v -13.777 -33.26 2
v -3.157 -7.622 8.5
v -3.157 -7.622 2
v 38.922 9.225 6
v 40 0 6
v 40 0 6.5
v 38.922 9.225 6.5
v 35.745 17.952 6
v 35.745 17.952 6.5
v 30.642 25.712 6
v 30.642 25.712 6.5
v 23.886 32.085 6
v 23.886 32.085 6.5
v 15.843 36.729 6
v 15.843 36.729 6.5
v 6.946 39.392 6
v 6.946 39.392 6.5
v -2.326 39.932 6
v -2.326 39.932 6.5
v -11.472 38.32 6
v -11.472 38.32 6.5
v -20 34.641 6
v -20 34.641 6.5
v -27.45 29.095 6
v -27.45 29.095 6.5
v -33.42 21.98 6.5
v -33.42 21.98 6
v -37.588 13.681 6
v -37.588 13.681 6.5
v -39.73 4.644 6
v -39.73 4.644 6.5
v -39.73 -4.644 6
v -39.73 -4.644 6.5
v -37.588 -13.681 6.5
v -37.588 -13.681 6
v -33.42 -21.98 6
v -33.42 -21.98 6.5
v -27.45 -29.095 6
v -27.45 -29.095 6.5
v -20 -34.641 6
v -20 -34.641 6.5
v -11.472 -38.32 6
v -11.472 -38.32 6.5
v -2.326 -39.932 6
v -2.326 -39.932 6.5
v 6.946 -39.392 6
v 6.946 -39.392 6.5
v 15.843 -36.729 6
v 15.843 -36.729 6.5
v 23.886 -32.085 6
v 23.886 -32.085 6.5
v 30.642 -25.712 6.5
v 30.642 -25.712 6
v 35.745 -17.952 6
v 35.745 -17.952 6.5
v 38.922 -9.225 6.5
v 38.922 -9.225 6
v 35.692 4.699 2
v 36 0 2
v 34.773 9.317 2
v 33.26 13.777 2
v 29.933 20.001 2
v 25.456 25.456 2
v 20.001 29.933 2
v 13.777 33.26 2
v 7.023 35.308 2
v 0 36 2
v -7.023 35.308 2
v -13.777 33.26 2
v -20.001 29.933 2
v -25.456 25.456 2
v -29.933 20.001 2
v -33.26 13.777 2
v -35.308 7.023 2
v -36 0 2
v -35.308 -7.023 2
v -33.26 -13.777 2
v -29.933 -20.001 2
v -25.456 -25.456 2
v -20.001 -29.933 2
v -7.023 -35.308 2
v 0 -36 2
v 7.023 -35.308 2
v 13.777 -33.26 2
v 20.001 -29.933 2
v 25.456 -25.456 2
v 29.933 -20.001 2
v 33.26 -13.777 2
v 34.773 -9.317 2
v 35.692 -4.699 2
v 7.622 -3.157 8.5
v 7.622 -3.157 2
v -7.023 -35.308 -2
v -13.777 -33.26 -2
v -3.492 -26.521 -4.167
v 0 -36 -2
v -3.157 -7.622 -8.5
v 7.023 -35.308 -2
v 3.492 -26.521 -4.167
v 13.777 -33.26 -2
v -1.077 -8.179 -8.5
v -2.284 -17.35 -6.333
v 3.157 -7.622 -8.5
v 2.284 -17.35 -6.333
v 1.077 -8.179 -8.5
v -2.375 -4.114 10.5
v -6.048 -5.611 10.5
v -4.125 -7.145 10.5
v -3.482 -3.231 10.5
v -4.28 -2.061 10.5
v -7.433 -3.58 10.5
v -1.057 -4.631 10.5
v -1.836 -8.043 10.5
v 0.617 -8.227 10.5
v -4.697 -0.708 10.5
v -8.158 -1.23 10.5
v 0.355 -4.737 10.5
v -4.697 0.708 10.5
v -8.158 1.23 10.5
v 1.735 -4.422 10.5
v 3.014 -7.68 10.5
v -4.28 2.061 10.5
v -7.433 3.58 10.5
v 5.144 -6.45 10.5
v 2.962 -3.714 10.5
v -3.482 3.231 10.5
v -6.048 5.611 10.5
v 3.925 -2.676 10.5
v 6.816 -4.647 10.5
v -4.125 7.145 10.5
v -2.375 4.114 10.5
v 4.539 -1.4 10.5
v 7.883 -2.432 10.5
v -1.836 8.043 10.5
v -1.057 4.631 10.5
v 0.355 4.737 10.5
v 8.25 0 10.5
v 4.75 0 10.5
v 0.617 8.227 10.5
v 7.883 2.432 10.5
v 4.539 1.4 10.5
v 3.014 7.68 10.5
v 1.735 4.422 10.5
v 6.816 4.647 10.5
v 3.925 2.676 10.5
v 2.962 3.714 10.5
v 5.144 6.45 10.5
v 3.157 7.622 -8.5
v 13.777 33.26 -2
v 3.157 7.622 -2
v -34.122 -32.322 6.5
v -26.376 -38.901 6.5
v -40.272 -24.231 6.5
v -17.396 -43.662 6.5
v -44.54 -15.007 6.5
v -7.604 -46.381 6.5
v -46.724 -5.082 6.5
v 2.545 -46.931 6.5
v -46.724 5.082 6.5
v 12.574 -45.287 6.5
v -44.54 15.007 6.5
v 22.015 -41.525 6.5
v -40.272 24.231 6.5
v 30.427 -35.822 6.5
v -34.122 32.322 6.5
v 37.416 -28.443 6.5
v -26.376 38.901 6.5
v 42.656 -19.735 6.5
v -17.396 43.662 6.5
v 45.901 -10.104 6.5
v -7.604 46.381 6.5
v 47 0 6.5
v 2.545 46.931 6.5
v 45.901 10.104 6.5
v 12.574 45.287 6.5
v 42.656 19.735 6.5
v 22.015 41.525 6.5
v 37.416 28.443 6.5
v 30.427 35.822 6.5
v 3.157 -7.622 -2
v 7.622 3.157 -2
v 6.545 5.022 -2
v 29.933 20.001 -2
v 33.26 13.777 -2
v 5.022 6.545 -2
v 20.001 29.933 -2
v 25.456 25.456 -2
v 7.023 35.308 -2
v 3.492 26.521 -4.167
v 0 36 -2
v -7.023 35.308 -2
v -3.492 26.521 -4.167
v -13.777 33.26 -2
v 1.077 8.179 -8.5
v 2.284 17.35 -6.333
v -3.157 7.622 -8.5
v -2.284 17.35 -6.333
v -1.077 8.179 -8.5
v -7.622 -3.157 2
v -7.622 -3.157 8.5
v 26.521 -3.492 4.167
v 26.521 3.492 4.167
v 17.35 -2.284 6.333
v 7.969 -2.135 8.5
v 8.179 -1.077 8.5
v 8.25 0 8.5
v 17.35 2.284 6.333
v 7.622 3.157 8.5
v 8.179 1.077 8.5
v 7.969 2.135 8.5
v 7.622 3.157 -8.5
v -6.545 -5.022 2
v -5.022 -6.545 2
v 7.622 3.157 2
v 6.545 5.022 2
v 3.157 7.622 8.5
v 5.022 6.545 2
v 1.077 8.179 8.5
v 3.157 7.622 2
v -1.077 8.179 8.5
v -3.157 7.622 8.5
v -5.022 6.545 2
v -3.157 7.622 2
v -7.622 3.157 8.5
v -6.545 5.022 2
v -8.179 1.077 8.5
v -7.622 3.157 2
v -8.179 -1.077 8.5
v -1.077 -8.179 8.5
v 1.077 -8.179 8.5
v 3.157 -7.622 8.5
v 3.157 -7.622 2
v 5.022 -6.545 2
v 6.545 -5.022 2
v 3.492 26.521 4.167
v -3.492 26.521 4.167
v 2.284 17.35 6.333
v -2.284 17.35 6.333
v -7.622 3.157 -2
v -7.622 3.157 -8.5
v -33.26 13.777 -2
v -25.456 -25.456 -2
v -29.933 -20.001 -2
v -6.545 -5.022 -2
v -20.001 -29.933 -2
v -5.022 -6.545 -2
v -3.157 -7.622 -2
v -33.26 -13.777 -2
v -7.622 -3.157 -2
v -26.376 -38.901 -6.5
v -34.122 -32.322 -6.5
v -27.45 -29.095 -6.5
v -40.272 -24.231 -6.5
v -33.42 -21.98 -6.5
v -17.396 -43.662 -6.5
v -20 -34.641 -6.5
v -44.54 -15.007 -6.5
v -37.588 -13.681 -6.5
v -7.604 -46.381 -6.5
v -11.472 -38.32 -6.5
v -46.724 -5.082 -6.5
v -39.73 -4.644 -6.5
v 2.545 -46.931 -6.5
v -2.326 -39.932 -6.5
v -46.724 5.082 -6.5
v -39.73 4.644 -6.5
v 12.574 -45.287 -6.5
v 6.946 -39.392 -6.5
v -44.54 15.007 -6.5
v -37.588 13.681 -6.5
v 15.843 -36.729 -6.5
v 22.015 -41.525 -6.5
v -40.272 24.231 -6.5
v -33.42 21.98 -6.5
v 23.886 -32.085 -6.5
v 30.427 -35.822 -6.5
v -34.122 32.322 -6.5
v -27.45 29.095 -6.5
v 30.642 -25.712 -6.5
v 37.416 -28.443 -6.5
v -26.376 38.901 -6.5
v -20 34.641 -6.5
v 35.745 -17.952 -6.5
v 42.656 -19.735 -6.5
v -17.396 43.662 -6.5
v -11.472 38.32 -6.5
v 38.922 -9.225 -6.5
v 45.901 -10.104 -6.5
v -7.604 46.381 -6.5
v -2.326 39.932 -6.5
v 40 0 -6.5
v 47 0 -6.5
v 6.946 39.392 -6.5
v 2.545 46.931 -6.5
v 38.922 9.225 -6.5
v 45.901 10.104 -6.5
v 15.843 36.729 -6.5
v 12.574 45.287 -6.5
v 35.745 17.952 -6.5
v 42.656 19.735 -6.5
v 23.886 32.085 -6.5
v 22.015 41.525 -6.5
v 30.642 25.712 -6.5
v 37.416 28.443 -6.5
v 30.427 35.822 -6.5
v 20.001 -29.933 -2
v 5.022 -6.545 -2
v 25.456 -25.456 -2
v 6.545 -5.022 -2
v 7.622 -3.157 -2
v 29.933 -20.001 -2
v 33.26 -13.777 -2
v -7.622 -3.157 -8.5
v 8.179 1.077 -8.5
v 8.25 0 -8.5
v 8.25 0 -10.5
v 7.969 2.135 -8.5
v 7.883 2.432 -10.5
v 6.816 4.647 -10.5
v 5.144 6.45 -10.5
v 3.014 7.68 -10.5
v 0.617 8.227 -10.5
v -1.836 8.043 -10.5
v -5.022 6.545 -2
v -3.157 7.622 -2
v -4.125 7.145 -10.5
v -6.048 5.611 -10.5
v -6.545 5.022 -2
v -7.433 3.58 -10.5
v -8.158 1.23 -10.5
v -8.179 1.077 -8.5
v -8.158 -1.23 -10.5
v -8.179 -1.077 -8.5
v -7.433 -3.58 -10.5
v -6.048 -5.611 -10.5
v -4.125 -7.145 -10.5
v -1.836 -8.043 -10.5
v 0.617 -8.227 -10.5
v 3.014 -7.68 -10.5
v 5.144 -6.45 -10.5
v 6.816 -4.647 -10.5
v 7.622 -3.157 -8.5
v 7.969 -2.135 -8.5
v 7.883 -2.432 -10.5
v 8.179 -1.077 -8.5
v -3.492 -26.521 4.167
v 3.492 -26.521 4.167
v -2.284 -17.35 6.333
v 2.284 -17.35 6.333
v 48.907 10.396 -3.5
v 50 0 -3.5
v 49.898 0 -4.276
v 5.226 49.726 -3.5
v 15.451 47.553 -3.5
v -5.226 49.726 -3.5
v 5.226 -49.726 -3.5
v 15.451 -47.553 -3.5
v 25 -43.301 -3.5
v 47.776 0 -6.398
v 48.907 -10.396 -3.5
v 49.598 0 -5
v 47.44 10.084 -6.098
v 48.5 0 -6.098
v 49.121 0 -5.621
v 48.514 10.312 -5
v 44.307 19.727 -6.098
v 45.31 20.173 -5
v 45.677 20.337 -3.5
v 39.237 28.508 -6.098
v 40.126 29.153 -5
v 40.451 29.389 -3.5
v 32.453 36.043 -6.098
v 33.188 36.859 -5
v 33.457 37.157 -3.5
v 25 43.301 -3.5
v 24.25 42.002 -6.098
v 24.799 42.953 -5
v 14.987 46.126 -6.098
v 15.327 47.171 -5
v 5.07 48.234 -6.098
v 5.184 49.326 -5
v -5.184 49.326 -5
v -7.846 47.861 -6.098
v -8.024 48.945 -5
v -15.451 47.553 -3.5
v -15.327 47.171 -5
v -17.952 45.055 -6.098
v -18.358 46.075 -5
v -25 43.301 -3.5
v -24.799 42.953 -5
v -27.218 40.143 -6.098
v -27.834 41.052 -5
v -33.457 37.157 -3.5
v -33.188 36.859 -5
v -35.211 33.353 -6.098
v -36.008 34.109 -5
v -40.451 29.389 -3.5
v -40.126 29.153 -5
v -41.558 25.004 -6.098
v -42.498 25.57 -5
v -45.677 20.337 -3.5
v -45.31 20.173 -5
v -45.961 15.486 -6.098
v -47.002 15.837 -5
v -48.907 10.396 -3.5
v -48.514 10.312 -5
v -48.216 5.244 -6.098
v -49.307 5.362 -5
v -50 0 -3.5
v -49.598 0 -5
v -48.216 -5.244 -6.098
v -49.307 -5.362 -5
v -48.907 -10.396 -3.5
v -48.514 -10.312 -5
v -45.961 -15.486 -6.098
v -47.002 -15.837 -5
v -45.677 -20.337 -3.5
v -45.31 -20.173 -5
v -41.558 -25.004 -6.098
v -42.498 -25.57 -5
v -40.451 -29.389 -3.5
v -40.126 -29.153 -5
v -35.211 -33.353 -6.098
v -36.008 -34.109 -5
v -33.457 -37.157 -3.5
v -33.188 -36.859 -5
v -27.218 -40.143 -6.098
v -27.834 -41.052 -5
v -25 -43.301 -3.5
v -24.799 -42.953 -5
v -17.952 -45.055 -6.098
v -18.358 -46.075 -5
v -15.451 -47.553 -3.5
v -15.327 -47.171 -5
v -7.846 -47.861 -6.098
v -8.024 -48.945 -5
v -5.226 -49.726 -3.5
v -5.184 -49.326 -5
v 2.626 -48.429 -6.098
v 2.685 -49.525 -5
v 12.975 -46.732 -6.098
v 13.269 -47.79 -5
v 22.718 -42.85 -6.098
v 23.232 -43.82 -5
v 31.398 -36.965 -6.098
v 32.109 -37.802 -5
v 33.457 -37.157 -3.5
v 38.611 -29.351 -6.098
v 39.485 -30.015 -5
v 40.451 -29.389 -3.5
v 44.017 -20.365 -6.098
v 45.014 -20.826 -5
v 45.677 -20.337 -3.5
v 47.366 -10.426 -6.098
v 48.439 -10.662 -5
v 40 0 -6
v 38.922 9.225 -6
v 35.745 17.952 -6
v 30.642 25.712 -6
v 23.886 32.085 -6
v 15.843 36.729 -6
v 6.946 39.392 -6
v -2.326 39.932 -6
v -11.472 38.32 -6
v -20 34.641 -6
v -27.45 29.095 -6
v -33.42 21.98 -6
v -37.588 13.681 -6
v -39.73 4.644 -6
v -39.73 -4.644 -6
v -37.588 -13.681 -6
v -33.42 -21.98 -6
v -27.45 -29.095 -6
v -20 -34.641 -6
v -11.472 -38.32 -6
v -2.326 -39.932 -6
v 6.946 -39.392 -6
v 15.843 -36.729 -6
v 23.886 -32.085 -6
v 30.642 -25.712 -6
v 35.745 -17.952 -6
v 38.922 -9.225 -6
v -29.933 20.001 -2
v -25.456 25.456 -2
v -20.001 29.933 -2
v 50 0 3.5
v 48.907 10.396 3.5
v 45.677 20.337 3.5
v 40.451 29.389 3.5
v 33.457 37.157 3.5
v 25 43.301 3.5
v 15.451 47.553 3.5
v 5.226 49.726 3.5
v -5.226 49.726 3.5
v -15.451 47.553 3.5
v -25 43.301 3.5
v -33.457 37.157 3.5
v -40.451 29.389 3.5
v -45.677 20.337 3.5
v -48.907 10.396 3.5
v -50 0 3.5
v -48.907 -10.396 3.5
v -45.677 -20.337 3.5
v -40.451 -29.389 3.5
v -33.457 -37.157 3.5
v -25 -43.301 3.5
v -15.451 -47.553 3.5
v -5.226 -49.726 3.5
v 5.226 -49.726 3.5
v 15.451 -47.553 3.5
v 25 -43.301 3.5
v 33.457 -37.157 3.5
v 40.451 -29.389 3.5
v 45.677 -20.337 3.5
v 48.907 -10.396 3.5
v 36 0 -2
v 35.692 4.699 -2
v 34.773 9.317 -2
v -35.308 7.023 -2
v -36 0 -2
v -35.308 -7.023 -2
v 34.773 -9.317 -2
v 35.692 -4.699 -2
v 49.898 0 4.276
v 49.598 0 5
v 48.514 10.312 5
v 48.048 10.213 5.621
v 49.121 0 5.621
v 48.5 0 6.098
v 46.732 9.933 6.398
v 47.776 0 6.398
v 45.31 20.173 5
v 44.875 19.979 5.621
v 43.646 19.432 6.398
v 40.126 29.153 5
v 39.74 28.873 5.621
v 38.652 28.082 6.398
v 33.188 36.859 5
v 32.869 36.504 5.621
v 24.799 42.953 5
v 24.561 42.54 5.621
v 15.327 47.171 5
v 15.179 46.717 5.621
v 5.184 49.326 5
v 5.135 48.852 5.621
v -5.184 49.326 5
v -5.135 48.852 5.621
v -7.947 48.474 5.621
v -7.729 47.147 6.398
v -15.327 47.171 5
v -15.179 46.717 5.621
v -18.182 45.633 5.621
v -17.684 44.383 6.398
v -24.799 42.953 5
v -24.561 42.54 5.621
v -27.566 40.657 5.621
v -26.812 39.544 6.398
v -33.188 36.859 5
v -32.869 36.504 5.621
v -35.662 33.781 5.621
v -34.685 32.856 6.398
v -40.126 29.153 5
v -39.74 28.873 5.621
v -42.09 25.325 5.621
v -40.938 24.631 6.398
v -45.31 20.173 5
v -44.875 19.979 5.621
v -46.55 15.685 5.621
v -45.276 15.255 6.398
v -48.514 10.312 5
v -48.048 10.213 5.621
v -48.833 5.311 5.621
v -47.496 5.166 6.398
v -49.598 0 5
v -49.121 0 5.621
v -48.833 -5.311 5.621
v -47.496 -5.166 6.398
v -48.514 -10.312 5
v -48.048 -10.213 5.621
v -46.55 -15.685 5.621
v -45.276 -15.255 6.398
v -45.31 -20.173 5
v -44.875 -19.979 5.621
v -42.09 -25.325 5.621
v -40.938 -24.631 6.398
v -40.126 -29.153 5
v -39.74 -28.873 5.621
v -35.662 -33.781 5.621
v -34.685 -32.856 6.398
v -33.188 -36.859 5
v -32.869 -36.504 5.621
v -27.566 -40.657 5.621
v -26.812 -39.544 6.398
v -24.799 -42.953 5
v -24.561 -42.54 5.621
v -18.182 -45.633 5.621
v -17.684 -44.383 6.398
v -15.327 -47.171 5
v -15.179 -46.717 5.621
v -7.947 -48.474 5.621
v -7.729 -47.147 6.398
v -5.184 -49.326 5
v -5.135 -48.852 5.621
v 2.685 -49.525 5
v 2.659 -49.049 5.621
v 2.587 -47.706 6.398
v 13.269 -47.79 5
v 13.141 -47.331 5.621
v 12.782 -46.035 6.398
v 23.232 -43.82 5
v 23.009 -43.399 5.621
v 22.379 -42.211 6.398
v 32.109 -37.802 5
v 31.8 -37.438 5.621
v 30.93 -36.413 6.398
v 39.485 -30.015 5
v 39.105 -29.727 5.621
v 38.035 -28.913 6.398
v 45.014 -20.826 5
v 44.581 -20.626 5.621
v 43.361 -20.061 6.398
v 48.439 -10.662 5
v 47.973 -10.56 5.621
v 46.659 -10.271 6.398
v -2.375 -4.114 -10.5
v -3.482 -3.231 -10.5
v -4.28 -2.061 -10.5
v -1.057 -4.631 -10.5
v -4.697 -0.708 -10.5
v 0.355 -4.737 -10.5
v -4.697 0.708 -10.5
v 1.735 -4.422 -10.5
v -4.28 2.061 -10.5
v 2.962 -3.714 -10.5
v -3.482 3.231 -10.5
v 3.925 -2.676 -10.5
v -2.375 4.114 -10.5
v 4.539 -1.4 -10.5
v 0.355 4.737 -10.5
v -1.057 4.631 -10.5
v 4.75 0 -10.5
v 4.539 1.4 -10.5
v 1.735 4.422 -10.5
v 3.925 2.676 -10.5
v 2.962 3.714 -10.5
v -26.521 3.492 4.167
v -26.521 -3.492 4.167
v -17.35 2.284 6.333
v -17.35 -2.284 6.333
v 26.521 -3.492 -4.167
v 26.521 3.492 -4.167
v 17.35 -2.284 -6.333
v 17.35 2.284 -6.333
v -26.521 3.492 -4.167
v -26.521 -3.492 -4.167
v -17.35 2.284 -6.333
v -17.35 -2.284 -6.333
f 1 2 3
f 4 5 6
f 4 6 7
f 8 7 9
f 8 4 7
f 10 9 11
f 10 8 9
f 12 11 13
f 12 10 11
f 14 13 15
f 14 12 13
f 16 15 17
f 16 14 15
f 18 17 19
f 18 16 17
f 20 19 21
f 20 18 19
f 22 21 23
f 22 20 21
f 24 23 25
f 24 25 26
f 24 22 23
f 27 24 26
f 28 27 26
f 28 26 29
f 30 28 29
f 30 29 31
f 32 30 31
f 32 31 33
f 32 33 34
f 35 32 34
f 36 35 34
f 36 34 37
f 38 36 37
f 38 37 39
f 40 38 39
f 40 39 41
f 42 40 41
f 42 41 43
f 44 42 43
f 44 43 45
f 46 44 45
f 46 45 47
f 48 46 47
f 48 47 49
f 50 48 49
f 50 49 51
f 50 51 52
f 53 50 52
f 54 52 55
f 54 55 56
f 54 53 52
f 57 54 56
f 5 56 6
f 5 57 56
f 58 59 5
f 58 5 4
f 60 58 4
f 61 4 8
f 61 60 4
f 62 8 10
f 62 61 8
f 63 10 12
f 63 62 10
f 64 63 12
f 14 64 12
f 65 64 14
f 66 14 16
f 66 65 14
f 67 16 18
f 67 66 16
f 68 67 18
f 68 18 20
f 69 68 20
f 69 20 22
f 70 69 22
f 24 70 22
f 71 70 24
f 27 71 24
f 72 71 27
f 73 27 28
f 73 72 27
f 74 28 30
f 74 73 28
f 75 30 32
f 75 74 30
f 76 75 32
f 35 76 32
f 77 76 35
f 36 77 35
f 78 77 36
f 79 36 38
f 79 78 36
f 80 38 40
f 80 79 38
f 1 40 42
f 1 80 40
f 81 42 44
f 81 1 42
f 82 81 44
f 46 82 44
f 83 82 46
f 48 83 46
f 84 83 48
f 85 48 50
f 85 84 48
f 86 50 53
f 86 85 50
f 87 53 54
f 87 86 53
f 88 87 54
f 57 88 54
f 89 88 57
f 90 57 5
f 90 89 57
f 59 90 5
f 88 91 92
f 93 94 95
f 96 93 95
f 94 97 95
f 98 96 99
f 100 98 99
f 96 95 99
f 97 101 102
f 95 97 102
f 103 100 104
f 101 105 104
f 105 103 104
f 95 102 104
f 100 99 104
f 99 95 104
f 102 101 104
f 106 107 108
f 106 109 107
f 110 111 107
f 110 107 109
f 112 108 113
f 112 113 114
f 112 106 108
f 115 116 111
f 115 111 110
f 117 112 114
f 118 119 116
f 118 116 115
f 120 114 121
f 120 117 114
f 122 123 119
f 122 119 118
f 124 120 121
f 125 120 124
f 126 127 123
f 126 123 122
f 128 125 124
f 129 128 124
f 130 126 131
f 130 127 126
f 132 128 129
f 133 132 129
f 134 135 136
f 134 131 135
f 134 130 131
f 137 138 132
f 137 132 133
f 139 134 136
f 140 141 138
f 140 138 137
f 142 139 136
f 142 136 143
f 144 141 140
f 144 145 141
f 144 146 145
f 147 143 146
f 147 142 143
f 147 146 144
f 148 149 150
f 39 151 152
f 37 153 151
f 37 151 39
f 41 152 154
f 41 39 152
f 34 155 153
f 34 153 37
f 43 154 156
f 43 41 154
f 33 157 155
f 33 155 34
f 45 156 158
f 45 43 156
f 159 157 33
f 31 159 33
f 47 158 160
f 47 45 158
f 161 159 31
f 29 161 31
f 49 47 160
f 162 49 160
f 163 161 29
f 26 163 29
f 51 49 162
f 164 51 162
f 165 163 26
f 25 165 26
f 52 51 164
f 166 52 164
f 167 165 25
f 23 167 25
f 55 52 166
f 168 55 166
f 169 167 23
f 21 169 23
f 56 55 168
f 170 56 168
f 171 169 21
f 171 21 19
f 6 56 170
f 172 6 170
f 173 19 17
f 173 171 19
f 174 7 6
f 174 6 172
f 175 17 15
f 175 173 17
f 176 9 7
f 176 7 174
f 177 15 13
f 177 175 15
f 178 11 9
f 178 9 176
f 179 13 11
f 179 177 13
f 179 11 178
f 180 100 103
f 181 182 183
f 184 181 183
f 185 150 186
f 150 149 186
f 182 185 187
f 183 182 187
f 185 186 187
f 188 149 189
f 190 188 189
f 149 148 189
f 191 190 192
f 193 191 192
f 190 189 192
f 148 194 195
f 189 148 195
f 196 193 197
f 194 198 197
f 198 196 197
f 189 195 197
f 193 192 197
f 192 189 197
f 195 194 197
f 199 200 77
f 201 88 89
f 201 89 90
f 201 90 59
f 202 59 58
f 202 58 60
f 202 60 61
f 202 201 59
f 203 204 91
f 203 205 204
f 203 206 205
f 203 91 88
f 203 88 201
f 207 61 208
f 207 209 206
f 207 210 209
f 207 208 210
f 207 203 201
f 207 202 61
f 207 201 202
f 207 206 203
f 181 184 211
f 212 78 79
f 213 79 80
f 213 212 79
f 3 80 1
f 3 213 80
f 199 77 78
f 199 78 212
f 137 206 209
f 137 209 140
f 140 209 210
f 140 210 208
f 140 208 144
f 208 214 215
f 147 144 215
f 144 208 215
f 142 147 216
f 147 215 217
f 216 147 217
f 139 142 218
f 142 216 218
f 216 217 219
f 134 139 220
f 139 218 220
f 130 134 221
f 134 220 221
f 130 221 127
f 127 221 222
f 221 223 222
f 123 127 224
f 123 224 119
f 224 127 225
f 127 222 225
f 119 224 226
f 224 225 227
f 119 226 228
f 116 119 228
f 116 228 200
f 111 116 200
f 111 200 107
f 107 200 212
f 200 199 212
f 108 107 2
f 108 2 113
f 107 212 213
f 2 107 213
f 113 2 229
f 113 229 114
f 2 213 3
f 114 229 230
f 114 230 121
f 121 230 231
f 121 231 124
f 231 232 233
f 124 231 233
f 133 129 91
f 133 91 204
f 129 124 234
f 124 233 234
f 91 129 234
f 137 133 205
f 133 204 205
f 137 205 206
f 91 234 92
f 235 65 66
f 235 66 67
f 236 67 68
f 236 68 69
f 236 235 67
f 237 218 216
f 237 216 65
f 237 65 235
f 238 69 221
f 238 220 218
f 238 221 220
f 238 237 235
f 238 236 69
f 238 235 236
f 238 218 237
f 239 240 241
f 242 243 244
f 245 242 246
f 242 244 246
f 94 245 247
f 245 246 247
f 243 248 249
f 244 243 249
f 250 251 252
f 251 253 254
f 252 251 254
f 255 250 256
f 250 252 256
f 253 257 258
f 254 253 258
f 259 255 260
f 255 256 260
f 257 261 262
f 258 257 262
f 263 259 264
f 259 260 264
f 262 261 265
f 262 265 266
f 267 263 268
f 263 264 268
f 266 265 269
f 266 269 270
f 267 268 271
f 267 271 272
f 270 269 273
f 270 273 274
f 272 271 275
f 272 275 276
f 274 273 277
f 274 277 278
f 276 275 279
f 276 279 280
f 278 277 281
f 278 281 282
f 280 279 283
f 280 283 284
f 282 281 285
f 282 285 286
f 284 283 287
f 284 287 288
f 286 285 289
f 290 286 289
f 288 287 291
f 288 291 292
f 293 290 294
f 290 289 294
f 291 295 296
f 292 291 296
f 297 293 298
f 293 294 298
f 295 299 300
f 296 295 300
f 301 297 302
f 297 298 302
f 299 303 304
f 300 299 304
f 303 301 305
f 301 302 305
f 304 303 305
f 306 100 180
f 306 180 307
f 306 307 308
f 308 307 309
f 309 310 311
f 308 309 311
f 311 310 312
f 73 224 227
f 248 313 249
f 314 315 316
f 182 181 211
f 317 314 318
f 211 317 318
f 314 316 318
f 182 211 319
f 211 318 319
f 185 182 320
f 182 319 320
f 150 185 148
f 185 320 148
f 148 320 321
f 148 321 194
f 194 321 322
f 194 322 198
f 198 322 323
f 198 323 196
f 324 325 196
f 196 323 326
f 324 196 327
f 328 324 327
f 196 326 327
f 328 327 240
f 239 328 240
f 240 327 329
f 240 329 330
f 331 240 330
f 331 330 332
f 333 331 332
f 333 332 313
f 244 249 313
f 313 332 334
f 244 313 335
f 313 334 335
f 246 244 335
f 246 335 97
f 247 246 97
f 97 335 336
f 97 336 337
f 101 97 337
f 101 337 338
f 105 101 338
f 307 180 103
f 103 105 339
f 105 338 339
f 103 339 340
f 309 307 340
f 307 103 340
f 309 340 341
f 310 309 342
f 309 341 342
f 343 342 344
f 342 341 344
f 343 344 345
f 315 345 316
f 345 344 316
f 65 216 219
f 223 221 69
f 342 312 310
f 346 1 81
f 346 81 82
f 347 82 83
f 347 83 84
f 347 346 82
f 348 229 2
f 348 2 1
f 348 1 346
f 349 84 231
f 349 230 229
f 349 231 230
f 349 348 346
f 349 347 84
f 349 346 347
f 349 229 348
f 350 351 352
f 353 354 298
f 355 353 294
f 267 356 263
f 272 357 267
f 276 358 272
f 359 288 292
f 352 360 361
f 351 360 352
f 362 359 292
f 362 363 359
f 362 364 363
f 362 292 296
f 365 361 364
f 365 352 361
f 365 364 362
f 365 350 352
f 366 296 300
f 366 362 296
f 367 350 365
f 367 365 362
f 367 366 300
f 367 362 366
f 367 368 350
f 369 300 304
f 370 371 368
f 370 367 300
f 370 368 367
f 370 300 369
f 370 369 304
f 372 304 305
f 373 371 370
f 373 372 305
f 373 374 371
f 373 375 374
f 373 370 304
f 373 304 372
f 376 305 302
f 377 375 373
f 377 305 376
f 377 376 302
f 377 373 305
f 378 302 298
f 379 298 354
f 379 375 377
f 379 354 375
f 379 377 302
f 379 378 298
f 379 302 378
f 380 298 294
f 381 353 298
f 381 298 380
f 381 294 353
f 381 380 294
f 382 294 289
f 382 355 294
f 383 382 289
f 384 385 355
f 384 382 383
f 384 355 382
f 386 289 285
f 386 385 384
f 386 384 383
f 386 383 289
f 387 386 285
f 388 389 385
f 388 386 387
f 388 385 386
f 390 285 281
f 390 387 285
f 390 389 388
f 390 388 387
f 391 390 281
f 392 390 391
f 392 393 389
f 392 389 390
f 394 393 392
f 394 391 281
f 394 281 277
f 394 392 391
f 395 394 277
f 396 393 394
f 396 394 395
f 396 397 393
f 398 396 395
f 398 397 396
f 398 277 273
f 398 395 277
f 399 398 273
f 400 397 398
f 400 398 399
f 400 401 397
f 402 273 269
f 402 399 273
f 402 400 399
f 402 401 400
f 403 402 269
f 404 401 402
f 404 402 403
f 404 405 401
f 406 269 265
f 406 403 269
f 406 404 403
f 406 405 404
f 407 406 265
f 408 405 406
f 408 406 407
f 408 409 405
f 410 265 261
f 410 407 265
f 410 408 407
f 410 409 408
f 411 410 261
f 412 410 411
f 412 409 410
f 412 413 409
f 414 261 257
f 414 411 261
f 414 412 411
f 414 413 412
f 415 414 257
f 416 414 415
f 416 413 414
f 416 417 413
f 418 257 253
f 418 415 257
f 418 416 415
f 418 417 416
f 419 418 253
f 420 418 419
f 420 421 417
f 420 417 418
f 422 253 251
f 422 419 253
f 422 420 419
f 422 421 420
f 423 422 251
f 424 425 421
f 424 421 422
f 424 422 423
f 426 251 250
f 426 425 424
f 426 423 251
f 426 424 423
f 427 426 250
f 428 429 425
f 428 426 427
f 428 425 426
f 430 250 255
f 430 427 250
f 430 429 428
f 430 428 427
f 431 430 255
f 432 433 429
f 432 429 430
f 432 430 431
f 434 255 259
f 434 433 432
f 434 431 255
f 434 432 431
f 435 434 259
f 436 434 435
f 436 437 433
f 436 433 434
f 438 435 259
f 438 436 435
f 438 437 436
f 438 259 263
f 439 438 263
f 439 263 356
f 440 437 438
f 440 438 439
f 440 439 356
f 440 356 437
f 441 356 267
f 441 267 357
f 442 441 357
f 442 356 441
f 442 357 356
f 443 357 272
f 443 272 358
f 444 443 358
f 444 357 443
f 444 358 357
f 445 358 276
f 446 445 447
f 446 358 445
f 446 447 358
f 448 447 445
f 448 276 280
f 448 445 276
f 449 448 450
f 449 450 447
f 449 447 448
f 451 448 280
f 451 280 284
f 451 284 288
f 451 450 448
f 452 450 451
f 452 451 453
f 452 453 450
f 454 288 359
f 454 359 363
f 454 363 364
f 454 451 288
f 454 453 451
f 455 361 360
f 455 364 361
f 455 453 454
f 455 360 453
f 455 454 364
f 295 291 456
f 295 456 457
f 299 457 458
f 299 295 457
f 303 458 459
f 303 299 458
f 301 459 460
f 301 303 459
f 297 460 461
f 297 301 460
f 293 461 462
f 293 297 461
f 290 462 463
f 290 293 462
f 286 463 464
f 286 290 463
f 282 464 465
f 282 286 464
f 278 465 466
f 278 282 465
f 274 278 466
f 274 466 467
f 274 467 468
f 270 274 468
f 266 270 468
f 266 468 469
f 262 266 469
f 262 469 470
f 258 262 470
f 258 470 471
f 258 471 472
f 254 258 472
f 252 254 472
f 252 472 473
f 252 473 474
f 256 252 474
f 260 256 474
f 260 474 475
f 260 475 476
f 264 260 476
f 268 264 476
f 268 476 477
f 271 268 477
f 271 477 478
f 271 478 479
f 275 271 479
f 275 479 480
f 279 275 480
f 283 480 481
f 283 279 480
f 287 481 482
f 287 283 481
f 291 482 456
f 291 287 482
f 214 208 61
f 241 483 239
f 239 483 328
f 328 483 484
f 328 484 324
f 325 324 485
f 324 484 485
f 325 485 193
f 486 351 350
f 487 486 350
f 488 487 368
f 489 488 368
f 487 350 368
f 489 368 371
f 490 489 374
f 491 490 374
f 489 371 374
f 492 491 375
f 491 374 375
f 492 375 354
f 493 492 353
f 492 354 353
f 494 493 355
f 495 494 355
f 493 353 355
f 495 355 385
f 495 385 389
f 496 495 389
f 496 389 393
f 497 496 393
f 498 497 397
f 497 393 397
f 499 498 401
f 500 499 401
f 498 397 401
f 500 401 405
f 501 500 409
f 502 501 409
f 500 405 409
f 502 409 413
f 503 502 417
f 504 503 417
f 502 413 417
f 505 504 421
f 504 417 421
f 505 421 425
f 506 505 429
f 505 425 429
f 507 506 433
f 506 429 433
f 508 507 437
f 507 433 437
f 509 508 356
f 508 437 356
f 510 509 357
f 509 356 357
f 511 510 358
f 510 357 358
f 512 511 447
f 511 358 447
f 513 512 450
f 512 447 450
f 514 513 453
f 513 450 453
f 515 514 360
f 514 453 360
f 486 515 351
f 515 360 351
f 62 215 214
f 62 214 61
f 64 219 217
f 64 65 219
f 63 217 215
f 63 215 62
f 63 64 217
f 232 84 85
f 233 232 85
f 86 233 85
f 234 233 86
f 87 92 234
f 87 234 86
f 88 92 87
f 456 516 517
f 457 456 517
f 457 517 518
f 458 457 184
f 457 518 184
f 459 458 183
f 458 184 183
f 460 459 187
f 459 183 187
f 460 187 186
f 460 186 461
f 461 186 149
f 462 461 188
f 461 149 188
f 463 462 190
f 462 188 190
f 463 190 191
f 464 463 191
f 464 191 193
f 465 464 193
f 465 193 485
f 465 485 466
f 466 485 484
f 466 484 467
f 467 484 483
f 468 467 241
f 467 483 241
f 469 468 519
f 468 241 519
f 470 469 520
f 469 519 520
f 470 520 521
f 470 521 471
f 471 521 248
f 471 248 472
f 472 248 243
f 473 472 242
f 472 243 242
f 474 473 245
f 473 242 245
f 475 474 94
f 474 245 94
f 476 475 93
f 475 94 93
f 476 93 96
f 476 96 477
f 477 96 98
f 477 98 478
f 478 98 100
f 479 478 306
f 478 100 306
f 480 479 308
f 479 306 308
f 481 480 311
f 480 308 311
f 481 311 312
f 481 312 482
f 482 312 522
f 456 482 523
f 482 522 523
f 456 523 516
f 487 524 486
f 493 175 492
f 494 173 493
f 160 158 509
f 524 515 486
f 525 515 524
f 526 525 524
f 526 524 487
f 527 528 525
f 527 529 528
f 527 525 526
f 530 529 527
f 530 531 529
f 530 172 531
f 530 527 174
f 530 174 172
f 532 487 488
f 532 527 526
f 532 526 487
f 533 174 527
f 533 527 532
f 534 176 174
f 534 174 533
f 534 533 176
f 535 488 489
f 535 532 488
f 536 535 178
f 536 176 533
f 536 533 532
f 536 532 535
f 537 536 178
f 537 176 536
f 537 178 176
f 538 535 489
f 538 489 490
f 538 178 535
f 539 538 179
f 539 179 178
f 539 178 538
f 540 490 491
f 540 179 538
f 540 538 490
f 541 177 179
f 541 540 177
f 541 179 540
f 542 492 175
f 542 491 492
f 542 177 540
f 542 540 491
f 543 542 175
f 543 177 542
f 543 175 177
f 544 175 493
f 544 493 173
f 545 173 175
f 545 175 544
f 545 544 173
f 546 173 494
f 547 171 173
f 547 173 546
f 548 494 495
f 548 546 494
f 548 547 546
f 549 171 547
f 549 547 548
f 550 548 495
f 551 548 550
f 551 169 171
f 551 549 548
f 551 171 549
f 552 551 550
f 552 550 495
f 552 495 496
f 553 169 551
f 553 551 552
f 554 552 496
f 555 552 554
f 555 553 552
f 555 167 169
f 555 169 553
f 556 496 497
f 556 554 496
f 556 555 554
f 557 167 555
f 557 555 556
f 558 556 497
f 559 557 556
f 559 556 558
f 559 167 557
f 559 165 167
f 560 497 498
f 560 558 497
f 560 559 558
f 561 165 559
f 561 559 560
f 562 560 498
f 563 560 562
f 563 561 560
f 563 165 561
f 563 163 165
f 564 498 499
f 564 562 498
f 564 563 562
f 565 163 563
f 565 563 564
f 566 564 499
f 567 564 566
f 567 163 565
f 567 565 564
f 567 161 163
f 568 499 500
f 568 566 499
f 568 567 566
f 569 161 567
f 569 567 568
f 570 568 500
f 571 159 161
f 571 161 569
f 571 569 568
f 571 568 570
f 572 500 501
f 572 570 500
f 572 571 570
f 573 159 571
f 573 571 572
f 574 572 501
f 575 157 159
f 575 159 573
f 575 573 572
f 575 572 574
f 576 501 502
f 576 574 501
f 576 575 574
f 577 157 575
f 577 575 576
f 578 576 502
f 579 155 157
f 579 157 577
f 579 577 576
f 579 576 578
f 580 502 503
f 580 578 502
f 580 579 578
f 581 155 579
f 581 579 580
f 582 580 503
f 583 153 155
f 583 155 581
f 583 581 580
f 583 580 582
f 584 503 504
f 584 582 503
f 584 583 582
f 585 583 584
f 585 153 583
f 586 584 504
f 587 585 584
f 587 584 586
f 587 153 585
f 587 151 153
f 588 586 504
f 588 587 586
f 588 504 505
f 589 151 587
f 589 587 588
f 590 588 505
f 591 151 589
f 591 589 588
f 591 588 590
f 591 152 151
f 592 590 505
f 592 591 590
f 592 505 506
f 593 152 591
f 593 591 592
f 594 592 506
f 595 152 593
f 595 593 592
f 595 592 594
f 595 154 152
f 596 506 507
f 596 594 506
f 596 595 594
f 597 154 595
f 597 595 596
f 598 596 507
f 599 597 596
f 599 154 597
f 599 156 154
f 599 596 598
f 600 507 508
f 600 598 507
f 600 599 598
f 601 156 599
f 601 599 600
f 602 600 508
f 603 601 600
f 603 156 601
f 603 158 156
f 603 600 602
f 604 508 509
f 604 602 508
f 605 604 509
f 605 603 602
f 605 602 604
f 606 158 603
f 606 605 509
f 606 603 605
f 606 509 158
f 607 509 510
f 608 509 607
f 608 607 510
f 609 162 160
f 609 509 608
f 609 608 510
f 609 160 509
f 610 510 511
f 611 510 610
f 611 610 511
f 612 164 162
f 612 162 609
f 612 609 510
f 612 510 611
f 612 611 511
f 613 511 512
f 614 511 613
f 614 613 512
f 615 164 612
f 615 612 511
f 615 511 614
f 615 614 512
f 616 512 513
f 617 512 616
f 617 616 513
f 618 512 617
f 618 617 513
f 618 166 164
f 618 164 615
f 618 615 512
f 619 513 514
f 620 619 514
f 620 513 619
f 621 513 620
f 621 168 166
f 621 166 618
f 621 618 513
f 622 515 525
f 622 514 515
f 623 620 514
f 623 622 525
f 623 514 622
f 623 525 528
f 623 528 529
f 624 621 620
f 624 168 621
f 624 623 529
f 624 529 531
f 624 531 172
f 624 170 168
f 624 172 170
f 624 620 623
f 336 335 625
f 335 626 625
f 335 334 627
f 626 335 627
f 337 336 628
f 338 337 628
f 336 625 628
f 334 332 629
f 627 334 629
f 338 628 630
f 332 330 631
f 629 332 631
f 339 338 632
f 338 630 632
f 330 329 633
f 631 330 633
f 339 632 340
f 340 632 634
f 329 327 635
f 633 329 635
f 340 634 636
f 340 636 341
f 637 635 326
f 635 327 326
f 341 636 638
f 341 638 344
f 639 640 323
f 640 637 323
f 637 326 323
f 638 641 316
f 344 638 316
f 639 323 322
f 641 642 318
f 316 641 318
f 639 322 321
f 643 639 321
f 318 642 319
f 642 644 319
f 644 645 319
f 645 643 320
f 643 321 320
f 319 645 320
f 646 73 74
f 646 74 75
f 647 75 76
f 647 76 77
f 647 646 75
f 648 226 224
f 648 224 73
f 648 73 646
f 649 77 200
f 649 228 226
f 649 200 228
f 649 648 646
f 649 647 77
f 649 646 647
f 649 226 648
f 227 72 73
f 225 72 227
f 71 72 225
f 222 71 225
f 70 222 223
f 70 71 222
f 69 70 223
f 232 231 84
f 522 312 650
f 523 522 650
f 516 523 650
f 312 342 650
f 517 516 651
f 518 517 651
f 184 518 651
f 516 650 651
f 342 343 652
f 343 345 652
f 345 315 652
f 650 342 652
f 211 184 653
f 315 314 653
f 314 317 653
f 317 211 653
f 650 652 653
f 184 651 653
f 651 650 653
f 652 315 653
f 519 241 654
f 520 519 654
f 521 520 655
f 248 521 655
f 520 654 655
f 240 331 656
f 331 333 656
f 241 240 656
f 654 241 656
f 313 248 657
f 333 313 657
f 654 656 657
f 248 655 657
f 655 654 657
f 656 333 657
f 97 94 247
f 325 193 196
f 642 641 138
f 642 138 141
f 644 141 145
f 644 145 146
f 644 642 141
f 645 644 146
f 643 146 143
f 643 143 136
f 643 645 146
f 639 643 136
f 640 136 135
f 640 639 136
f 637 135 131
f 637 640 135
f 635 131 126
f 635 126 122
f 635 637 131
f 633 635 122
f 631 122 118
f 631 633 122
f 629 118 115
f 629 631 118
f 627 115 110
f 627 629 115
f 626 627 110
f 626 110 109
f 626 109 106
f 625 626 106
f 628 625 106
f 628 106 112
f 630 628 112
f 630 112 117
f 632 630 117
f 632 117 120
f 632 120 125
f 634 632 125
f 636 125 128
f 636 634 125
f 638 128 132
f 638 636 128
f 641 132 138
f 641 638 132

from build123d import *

# Parameters (mm, degrees)
BOSS_EXTRUDE1_DEPTH      = 10.5
BOSS_EXTRUDE1_DEPTH_BACK = 10.5
SKETCH1_R                = 8.25
SKETCH1_R_2              = 4.75
BOSS_EXTRUDE2_DEPTH      = 6.5
BOSS_EXTRUDE2_DEPTH_BACK = 6.5
SKETCH2_R                = 50
SKETCH2_R_2              = 40
BOSS_EXTRUDE3_DEPTH      = 2
BOSS_EXTRUDE3_DEPTH_BACK = 2
SKETCH3_R                = 40
SKETCH3_R_2              = 8.25
CHAMFER1_SIZE            = 4
FILLET1_R                = 3
REVOLVE1_ANGLE           = 45
CIRPATTERN1_COUNT        = 4
MIRROR1_COPY_1_ANGLE     = 45
MIRROR1_COPY_2_ANGLE     = 45
MIRROR1_COPY_3_ANGLE     = 45


# Read off the part's stored shape, not the designer's step: Revolve1
with BuildPart() as part:
    # Sketch1 → Boss-Extrude1 (new, two sides: drawn at the far end of the back side and taken through both)
    with BuildSketch(Plane.XY.offset(-BOSS_EXTRUDE1_DEPTH_BACK)):
        Circle(SKETCH1_R)
        Circle(SKETCH1_R_2, mode=Mode.SUBTRACT)
    extrude(amount=BOSS_EXTRUDE1_DEPTH + BOSS_EXTRUDE1_DEPTH_BACK)



with BuildPart() as body_2:
    # Sketch2 → Boss-Extrude2 (new, two sides: drawn at the far end of the back side and taken through both)
    with BuildSketch(Plane.XY.offset(-BOSS_EXTRUDE2_DEPTH_BACK)):
        Circle(SKETCH2_R)
        Circle(SKETCH2_R_2, mode=Mode.SUBTRACT)
    extrude(amount=BOSS_EXTRUDE2_DEPTH + BOSS_EXTRUDE2_DEPTH_BACK)


with BuildPart() as part_1:
    add(part.part)

    add(body_2.part)  # Boss-Extrude3 merges body 2
    # Sketch3 → Boss-Extrude3 (add, two sides: drawn at the far end of the back side and taken through both)
    with BuildSketch(Plane.XY.offset(-BOSS_EXTRUDE3_DEPTH_BACK)):
        Circle(SKETCH3_R)
        Circle(SKETCH3_R_2, mode=Mode.SUBTRACT)
    extrude(amount=BOSS_EXTRUDE3_DEPTH + BOSS_EXTRUDE3_DEPTH_BACK)

    # Chamfer1
    chamfer1_edges = [part_1.edges().sort_by_distance(p)[0] for p in [
        (-40, 0, -2),
        (-40, 0, 2),
    ]]
    chamfer(chamfer1_edges, length=CHAMFER1_SIZE)

    # Fillet1
    fillet1_edges = [part_1.edges().sort_by_distance(p)[0] for p in [
        (-50, 0, -6.5),
        (-50, 0, 6.5),
    ]]
    fillet(fillet1_edges, radius=FILLET1_R)

    # Revolve1 outline → Revolve1 (revolve)
    with BuildSketch(Plane(origin=(0, 0, 0), x_dir=(-0.9238795325112862, 0.3826834323650911, 0), z_dir=(0.3826834323650911, 0.9238795325112862, 0))):
        Polygon((36, 2), (8.25, 8.5), (8.25, 2), align=None)
    revolve1 = revolve(axis=Axis((0, 0, 0), (0, 0, 1)), revolution_arc=REVOLVE1_ANGLE)

    # CirPattern1: Revolve1 ×4 about axis
    cirpattern1_axis = Axis((0, 0, -10.5), (0, 0, 1))
    for i in range(1, CIRPATTERN1_COUNT):
        add(revolve1.rotate(cirpattern1_axis, i * 360 / CIRPATTERN1_COUNT))

    # Mirror1: Revolve1 across plane
    add(revolve1.mirror(Plane.XY))

    # Mirror1 copy 1 sketch → Mirror1 copy 1 (revolve)
    with BuildSketch(Plane(origin=(0, 0, 0), x_dir=(-0.38268343236509117, -0.9238795325112862, 0), z_dir=(-0.9238795325112862, 0.38268343236509117, 0))):
        Polygon((36, -2), (8.25, -8.5), (8.25, -2), align=None)
    revolve(axis=Axis((0, 0, 0), (0, 0, 1)), revolution_arc=MIRROR1_COPY_1_ANGLE)

    # Mirror1 copy 2 sketch → Mirror1 copy 2 (revolve)
    with BuildSketch(Plane(origin=(0, 0, 0), x_dir=(0.9238795325112862, -0.3826834323650912, 0), z_dir=(-0.3826834323650912, -0.9238795325112862, 0))):
        Polygon((36, -2), (8.25, -8.5), (8.25, -2), align=None)
    revolve(axis=Axis((0, 0, 0), (0, 0, 1)), revolution_arc=MIRROR1_COPY_2_ANGLE)

    # Mirror1 copy 3 sketch → Mirror1 copy 3 (revolve)
    with BuildSketch(Plane(origin=(0, 0, 0), x_dir=(0.3826834323650913, 0.9238795325112861, 0), z_dir=(0.9238795325112861, -0.3826834323650913, 0))):
        Polygon((36, -2), (8.25, -8.5), (8.25, -2), align=None)
    revolve(axis=Axis((0, 0, 0), (0, 0, 1)), revolution_arc=MIRROR1_COPY_3_ANGLE)


solid = part_1.part
